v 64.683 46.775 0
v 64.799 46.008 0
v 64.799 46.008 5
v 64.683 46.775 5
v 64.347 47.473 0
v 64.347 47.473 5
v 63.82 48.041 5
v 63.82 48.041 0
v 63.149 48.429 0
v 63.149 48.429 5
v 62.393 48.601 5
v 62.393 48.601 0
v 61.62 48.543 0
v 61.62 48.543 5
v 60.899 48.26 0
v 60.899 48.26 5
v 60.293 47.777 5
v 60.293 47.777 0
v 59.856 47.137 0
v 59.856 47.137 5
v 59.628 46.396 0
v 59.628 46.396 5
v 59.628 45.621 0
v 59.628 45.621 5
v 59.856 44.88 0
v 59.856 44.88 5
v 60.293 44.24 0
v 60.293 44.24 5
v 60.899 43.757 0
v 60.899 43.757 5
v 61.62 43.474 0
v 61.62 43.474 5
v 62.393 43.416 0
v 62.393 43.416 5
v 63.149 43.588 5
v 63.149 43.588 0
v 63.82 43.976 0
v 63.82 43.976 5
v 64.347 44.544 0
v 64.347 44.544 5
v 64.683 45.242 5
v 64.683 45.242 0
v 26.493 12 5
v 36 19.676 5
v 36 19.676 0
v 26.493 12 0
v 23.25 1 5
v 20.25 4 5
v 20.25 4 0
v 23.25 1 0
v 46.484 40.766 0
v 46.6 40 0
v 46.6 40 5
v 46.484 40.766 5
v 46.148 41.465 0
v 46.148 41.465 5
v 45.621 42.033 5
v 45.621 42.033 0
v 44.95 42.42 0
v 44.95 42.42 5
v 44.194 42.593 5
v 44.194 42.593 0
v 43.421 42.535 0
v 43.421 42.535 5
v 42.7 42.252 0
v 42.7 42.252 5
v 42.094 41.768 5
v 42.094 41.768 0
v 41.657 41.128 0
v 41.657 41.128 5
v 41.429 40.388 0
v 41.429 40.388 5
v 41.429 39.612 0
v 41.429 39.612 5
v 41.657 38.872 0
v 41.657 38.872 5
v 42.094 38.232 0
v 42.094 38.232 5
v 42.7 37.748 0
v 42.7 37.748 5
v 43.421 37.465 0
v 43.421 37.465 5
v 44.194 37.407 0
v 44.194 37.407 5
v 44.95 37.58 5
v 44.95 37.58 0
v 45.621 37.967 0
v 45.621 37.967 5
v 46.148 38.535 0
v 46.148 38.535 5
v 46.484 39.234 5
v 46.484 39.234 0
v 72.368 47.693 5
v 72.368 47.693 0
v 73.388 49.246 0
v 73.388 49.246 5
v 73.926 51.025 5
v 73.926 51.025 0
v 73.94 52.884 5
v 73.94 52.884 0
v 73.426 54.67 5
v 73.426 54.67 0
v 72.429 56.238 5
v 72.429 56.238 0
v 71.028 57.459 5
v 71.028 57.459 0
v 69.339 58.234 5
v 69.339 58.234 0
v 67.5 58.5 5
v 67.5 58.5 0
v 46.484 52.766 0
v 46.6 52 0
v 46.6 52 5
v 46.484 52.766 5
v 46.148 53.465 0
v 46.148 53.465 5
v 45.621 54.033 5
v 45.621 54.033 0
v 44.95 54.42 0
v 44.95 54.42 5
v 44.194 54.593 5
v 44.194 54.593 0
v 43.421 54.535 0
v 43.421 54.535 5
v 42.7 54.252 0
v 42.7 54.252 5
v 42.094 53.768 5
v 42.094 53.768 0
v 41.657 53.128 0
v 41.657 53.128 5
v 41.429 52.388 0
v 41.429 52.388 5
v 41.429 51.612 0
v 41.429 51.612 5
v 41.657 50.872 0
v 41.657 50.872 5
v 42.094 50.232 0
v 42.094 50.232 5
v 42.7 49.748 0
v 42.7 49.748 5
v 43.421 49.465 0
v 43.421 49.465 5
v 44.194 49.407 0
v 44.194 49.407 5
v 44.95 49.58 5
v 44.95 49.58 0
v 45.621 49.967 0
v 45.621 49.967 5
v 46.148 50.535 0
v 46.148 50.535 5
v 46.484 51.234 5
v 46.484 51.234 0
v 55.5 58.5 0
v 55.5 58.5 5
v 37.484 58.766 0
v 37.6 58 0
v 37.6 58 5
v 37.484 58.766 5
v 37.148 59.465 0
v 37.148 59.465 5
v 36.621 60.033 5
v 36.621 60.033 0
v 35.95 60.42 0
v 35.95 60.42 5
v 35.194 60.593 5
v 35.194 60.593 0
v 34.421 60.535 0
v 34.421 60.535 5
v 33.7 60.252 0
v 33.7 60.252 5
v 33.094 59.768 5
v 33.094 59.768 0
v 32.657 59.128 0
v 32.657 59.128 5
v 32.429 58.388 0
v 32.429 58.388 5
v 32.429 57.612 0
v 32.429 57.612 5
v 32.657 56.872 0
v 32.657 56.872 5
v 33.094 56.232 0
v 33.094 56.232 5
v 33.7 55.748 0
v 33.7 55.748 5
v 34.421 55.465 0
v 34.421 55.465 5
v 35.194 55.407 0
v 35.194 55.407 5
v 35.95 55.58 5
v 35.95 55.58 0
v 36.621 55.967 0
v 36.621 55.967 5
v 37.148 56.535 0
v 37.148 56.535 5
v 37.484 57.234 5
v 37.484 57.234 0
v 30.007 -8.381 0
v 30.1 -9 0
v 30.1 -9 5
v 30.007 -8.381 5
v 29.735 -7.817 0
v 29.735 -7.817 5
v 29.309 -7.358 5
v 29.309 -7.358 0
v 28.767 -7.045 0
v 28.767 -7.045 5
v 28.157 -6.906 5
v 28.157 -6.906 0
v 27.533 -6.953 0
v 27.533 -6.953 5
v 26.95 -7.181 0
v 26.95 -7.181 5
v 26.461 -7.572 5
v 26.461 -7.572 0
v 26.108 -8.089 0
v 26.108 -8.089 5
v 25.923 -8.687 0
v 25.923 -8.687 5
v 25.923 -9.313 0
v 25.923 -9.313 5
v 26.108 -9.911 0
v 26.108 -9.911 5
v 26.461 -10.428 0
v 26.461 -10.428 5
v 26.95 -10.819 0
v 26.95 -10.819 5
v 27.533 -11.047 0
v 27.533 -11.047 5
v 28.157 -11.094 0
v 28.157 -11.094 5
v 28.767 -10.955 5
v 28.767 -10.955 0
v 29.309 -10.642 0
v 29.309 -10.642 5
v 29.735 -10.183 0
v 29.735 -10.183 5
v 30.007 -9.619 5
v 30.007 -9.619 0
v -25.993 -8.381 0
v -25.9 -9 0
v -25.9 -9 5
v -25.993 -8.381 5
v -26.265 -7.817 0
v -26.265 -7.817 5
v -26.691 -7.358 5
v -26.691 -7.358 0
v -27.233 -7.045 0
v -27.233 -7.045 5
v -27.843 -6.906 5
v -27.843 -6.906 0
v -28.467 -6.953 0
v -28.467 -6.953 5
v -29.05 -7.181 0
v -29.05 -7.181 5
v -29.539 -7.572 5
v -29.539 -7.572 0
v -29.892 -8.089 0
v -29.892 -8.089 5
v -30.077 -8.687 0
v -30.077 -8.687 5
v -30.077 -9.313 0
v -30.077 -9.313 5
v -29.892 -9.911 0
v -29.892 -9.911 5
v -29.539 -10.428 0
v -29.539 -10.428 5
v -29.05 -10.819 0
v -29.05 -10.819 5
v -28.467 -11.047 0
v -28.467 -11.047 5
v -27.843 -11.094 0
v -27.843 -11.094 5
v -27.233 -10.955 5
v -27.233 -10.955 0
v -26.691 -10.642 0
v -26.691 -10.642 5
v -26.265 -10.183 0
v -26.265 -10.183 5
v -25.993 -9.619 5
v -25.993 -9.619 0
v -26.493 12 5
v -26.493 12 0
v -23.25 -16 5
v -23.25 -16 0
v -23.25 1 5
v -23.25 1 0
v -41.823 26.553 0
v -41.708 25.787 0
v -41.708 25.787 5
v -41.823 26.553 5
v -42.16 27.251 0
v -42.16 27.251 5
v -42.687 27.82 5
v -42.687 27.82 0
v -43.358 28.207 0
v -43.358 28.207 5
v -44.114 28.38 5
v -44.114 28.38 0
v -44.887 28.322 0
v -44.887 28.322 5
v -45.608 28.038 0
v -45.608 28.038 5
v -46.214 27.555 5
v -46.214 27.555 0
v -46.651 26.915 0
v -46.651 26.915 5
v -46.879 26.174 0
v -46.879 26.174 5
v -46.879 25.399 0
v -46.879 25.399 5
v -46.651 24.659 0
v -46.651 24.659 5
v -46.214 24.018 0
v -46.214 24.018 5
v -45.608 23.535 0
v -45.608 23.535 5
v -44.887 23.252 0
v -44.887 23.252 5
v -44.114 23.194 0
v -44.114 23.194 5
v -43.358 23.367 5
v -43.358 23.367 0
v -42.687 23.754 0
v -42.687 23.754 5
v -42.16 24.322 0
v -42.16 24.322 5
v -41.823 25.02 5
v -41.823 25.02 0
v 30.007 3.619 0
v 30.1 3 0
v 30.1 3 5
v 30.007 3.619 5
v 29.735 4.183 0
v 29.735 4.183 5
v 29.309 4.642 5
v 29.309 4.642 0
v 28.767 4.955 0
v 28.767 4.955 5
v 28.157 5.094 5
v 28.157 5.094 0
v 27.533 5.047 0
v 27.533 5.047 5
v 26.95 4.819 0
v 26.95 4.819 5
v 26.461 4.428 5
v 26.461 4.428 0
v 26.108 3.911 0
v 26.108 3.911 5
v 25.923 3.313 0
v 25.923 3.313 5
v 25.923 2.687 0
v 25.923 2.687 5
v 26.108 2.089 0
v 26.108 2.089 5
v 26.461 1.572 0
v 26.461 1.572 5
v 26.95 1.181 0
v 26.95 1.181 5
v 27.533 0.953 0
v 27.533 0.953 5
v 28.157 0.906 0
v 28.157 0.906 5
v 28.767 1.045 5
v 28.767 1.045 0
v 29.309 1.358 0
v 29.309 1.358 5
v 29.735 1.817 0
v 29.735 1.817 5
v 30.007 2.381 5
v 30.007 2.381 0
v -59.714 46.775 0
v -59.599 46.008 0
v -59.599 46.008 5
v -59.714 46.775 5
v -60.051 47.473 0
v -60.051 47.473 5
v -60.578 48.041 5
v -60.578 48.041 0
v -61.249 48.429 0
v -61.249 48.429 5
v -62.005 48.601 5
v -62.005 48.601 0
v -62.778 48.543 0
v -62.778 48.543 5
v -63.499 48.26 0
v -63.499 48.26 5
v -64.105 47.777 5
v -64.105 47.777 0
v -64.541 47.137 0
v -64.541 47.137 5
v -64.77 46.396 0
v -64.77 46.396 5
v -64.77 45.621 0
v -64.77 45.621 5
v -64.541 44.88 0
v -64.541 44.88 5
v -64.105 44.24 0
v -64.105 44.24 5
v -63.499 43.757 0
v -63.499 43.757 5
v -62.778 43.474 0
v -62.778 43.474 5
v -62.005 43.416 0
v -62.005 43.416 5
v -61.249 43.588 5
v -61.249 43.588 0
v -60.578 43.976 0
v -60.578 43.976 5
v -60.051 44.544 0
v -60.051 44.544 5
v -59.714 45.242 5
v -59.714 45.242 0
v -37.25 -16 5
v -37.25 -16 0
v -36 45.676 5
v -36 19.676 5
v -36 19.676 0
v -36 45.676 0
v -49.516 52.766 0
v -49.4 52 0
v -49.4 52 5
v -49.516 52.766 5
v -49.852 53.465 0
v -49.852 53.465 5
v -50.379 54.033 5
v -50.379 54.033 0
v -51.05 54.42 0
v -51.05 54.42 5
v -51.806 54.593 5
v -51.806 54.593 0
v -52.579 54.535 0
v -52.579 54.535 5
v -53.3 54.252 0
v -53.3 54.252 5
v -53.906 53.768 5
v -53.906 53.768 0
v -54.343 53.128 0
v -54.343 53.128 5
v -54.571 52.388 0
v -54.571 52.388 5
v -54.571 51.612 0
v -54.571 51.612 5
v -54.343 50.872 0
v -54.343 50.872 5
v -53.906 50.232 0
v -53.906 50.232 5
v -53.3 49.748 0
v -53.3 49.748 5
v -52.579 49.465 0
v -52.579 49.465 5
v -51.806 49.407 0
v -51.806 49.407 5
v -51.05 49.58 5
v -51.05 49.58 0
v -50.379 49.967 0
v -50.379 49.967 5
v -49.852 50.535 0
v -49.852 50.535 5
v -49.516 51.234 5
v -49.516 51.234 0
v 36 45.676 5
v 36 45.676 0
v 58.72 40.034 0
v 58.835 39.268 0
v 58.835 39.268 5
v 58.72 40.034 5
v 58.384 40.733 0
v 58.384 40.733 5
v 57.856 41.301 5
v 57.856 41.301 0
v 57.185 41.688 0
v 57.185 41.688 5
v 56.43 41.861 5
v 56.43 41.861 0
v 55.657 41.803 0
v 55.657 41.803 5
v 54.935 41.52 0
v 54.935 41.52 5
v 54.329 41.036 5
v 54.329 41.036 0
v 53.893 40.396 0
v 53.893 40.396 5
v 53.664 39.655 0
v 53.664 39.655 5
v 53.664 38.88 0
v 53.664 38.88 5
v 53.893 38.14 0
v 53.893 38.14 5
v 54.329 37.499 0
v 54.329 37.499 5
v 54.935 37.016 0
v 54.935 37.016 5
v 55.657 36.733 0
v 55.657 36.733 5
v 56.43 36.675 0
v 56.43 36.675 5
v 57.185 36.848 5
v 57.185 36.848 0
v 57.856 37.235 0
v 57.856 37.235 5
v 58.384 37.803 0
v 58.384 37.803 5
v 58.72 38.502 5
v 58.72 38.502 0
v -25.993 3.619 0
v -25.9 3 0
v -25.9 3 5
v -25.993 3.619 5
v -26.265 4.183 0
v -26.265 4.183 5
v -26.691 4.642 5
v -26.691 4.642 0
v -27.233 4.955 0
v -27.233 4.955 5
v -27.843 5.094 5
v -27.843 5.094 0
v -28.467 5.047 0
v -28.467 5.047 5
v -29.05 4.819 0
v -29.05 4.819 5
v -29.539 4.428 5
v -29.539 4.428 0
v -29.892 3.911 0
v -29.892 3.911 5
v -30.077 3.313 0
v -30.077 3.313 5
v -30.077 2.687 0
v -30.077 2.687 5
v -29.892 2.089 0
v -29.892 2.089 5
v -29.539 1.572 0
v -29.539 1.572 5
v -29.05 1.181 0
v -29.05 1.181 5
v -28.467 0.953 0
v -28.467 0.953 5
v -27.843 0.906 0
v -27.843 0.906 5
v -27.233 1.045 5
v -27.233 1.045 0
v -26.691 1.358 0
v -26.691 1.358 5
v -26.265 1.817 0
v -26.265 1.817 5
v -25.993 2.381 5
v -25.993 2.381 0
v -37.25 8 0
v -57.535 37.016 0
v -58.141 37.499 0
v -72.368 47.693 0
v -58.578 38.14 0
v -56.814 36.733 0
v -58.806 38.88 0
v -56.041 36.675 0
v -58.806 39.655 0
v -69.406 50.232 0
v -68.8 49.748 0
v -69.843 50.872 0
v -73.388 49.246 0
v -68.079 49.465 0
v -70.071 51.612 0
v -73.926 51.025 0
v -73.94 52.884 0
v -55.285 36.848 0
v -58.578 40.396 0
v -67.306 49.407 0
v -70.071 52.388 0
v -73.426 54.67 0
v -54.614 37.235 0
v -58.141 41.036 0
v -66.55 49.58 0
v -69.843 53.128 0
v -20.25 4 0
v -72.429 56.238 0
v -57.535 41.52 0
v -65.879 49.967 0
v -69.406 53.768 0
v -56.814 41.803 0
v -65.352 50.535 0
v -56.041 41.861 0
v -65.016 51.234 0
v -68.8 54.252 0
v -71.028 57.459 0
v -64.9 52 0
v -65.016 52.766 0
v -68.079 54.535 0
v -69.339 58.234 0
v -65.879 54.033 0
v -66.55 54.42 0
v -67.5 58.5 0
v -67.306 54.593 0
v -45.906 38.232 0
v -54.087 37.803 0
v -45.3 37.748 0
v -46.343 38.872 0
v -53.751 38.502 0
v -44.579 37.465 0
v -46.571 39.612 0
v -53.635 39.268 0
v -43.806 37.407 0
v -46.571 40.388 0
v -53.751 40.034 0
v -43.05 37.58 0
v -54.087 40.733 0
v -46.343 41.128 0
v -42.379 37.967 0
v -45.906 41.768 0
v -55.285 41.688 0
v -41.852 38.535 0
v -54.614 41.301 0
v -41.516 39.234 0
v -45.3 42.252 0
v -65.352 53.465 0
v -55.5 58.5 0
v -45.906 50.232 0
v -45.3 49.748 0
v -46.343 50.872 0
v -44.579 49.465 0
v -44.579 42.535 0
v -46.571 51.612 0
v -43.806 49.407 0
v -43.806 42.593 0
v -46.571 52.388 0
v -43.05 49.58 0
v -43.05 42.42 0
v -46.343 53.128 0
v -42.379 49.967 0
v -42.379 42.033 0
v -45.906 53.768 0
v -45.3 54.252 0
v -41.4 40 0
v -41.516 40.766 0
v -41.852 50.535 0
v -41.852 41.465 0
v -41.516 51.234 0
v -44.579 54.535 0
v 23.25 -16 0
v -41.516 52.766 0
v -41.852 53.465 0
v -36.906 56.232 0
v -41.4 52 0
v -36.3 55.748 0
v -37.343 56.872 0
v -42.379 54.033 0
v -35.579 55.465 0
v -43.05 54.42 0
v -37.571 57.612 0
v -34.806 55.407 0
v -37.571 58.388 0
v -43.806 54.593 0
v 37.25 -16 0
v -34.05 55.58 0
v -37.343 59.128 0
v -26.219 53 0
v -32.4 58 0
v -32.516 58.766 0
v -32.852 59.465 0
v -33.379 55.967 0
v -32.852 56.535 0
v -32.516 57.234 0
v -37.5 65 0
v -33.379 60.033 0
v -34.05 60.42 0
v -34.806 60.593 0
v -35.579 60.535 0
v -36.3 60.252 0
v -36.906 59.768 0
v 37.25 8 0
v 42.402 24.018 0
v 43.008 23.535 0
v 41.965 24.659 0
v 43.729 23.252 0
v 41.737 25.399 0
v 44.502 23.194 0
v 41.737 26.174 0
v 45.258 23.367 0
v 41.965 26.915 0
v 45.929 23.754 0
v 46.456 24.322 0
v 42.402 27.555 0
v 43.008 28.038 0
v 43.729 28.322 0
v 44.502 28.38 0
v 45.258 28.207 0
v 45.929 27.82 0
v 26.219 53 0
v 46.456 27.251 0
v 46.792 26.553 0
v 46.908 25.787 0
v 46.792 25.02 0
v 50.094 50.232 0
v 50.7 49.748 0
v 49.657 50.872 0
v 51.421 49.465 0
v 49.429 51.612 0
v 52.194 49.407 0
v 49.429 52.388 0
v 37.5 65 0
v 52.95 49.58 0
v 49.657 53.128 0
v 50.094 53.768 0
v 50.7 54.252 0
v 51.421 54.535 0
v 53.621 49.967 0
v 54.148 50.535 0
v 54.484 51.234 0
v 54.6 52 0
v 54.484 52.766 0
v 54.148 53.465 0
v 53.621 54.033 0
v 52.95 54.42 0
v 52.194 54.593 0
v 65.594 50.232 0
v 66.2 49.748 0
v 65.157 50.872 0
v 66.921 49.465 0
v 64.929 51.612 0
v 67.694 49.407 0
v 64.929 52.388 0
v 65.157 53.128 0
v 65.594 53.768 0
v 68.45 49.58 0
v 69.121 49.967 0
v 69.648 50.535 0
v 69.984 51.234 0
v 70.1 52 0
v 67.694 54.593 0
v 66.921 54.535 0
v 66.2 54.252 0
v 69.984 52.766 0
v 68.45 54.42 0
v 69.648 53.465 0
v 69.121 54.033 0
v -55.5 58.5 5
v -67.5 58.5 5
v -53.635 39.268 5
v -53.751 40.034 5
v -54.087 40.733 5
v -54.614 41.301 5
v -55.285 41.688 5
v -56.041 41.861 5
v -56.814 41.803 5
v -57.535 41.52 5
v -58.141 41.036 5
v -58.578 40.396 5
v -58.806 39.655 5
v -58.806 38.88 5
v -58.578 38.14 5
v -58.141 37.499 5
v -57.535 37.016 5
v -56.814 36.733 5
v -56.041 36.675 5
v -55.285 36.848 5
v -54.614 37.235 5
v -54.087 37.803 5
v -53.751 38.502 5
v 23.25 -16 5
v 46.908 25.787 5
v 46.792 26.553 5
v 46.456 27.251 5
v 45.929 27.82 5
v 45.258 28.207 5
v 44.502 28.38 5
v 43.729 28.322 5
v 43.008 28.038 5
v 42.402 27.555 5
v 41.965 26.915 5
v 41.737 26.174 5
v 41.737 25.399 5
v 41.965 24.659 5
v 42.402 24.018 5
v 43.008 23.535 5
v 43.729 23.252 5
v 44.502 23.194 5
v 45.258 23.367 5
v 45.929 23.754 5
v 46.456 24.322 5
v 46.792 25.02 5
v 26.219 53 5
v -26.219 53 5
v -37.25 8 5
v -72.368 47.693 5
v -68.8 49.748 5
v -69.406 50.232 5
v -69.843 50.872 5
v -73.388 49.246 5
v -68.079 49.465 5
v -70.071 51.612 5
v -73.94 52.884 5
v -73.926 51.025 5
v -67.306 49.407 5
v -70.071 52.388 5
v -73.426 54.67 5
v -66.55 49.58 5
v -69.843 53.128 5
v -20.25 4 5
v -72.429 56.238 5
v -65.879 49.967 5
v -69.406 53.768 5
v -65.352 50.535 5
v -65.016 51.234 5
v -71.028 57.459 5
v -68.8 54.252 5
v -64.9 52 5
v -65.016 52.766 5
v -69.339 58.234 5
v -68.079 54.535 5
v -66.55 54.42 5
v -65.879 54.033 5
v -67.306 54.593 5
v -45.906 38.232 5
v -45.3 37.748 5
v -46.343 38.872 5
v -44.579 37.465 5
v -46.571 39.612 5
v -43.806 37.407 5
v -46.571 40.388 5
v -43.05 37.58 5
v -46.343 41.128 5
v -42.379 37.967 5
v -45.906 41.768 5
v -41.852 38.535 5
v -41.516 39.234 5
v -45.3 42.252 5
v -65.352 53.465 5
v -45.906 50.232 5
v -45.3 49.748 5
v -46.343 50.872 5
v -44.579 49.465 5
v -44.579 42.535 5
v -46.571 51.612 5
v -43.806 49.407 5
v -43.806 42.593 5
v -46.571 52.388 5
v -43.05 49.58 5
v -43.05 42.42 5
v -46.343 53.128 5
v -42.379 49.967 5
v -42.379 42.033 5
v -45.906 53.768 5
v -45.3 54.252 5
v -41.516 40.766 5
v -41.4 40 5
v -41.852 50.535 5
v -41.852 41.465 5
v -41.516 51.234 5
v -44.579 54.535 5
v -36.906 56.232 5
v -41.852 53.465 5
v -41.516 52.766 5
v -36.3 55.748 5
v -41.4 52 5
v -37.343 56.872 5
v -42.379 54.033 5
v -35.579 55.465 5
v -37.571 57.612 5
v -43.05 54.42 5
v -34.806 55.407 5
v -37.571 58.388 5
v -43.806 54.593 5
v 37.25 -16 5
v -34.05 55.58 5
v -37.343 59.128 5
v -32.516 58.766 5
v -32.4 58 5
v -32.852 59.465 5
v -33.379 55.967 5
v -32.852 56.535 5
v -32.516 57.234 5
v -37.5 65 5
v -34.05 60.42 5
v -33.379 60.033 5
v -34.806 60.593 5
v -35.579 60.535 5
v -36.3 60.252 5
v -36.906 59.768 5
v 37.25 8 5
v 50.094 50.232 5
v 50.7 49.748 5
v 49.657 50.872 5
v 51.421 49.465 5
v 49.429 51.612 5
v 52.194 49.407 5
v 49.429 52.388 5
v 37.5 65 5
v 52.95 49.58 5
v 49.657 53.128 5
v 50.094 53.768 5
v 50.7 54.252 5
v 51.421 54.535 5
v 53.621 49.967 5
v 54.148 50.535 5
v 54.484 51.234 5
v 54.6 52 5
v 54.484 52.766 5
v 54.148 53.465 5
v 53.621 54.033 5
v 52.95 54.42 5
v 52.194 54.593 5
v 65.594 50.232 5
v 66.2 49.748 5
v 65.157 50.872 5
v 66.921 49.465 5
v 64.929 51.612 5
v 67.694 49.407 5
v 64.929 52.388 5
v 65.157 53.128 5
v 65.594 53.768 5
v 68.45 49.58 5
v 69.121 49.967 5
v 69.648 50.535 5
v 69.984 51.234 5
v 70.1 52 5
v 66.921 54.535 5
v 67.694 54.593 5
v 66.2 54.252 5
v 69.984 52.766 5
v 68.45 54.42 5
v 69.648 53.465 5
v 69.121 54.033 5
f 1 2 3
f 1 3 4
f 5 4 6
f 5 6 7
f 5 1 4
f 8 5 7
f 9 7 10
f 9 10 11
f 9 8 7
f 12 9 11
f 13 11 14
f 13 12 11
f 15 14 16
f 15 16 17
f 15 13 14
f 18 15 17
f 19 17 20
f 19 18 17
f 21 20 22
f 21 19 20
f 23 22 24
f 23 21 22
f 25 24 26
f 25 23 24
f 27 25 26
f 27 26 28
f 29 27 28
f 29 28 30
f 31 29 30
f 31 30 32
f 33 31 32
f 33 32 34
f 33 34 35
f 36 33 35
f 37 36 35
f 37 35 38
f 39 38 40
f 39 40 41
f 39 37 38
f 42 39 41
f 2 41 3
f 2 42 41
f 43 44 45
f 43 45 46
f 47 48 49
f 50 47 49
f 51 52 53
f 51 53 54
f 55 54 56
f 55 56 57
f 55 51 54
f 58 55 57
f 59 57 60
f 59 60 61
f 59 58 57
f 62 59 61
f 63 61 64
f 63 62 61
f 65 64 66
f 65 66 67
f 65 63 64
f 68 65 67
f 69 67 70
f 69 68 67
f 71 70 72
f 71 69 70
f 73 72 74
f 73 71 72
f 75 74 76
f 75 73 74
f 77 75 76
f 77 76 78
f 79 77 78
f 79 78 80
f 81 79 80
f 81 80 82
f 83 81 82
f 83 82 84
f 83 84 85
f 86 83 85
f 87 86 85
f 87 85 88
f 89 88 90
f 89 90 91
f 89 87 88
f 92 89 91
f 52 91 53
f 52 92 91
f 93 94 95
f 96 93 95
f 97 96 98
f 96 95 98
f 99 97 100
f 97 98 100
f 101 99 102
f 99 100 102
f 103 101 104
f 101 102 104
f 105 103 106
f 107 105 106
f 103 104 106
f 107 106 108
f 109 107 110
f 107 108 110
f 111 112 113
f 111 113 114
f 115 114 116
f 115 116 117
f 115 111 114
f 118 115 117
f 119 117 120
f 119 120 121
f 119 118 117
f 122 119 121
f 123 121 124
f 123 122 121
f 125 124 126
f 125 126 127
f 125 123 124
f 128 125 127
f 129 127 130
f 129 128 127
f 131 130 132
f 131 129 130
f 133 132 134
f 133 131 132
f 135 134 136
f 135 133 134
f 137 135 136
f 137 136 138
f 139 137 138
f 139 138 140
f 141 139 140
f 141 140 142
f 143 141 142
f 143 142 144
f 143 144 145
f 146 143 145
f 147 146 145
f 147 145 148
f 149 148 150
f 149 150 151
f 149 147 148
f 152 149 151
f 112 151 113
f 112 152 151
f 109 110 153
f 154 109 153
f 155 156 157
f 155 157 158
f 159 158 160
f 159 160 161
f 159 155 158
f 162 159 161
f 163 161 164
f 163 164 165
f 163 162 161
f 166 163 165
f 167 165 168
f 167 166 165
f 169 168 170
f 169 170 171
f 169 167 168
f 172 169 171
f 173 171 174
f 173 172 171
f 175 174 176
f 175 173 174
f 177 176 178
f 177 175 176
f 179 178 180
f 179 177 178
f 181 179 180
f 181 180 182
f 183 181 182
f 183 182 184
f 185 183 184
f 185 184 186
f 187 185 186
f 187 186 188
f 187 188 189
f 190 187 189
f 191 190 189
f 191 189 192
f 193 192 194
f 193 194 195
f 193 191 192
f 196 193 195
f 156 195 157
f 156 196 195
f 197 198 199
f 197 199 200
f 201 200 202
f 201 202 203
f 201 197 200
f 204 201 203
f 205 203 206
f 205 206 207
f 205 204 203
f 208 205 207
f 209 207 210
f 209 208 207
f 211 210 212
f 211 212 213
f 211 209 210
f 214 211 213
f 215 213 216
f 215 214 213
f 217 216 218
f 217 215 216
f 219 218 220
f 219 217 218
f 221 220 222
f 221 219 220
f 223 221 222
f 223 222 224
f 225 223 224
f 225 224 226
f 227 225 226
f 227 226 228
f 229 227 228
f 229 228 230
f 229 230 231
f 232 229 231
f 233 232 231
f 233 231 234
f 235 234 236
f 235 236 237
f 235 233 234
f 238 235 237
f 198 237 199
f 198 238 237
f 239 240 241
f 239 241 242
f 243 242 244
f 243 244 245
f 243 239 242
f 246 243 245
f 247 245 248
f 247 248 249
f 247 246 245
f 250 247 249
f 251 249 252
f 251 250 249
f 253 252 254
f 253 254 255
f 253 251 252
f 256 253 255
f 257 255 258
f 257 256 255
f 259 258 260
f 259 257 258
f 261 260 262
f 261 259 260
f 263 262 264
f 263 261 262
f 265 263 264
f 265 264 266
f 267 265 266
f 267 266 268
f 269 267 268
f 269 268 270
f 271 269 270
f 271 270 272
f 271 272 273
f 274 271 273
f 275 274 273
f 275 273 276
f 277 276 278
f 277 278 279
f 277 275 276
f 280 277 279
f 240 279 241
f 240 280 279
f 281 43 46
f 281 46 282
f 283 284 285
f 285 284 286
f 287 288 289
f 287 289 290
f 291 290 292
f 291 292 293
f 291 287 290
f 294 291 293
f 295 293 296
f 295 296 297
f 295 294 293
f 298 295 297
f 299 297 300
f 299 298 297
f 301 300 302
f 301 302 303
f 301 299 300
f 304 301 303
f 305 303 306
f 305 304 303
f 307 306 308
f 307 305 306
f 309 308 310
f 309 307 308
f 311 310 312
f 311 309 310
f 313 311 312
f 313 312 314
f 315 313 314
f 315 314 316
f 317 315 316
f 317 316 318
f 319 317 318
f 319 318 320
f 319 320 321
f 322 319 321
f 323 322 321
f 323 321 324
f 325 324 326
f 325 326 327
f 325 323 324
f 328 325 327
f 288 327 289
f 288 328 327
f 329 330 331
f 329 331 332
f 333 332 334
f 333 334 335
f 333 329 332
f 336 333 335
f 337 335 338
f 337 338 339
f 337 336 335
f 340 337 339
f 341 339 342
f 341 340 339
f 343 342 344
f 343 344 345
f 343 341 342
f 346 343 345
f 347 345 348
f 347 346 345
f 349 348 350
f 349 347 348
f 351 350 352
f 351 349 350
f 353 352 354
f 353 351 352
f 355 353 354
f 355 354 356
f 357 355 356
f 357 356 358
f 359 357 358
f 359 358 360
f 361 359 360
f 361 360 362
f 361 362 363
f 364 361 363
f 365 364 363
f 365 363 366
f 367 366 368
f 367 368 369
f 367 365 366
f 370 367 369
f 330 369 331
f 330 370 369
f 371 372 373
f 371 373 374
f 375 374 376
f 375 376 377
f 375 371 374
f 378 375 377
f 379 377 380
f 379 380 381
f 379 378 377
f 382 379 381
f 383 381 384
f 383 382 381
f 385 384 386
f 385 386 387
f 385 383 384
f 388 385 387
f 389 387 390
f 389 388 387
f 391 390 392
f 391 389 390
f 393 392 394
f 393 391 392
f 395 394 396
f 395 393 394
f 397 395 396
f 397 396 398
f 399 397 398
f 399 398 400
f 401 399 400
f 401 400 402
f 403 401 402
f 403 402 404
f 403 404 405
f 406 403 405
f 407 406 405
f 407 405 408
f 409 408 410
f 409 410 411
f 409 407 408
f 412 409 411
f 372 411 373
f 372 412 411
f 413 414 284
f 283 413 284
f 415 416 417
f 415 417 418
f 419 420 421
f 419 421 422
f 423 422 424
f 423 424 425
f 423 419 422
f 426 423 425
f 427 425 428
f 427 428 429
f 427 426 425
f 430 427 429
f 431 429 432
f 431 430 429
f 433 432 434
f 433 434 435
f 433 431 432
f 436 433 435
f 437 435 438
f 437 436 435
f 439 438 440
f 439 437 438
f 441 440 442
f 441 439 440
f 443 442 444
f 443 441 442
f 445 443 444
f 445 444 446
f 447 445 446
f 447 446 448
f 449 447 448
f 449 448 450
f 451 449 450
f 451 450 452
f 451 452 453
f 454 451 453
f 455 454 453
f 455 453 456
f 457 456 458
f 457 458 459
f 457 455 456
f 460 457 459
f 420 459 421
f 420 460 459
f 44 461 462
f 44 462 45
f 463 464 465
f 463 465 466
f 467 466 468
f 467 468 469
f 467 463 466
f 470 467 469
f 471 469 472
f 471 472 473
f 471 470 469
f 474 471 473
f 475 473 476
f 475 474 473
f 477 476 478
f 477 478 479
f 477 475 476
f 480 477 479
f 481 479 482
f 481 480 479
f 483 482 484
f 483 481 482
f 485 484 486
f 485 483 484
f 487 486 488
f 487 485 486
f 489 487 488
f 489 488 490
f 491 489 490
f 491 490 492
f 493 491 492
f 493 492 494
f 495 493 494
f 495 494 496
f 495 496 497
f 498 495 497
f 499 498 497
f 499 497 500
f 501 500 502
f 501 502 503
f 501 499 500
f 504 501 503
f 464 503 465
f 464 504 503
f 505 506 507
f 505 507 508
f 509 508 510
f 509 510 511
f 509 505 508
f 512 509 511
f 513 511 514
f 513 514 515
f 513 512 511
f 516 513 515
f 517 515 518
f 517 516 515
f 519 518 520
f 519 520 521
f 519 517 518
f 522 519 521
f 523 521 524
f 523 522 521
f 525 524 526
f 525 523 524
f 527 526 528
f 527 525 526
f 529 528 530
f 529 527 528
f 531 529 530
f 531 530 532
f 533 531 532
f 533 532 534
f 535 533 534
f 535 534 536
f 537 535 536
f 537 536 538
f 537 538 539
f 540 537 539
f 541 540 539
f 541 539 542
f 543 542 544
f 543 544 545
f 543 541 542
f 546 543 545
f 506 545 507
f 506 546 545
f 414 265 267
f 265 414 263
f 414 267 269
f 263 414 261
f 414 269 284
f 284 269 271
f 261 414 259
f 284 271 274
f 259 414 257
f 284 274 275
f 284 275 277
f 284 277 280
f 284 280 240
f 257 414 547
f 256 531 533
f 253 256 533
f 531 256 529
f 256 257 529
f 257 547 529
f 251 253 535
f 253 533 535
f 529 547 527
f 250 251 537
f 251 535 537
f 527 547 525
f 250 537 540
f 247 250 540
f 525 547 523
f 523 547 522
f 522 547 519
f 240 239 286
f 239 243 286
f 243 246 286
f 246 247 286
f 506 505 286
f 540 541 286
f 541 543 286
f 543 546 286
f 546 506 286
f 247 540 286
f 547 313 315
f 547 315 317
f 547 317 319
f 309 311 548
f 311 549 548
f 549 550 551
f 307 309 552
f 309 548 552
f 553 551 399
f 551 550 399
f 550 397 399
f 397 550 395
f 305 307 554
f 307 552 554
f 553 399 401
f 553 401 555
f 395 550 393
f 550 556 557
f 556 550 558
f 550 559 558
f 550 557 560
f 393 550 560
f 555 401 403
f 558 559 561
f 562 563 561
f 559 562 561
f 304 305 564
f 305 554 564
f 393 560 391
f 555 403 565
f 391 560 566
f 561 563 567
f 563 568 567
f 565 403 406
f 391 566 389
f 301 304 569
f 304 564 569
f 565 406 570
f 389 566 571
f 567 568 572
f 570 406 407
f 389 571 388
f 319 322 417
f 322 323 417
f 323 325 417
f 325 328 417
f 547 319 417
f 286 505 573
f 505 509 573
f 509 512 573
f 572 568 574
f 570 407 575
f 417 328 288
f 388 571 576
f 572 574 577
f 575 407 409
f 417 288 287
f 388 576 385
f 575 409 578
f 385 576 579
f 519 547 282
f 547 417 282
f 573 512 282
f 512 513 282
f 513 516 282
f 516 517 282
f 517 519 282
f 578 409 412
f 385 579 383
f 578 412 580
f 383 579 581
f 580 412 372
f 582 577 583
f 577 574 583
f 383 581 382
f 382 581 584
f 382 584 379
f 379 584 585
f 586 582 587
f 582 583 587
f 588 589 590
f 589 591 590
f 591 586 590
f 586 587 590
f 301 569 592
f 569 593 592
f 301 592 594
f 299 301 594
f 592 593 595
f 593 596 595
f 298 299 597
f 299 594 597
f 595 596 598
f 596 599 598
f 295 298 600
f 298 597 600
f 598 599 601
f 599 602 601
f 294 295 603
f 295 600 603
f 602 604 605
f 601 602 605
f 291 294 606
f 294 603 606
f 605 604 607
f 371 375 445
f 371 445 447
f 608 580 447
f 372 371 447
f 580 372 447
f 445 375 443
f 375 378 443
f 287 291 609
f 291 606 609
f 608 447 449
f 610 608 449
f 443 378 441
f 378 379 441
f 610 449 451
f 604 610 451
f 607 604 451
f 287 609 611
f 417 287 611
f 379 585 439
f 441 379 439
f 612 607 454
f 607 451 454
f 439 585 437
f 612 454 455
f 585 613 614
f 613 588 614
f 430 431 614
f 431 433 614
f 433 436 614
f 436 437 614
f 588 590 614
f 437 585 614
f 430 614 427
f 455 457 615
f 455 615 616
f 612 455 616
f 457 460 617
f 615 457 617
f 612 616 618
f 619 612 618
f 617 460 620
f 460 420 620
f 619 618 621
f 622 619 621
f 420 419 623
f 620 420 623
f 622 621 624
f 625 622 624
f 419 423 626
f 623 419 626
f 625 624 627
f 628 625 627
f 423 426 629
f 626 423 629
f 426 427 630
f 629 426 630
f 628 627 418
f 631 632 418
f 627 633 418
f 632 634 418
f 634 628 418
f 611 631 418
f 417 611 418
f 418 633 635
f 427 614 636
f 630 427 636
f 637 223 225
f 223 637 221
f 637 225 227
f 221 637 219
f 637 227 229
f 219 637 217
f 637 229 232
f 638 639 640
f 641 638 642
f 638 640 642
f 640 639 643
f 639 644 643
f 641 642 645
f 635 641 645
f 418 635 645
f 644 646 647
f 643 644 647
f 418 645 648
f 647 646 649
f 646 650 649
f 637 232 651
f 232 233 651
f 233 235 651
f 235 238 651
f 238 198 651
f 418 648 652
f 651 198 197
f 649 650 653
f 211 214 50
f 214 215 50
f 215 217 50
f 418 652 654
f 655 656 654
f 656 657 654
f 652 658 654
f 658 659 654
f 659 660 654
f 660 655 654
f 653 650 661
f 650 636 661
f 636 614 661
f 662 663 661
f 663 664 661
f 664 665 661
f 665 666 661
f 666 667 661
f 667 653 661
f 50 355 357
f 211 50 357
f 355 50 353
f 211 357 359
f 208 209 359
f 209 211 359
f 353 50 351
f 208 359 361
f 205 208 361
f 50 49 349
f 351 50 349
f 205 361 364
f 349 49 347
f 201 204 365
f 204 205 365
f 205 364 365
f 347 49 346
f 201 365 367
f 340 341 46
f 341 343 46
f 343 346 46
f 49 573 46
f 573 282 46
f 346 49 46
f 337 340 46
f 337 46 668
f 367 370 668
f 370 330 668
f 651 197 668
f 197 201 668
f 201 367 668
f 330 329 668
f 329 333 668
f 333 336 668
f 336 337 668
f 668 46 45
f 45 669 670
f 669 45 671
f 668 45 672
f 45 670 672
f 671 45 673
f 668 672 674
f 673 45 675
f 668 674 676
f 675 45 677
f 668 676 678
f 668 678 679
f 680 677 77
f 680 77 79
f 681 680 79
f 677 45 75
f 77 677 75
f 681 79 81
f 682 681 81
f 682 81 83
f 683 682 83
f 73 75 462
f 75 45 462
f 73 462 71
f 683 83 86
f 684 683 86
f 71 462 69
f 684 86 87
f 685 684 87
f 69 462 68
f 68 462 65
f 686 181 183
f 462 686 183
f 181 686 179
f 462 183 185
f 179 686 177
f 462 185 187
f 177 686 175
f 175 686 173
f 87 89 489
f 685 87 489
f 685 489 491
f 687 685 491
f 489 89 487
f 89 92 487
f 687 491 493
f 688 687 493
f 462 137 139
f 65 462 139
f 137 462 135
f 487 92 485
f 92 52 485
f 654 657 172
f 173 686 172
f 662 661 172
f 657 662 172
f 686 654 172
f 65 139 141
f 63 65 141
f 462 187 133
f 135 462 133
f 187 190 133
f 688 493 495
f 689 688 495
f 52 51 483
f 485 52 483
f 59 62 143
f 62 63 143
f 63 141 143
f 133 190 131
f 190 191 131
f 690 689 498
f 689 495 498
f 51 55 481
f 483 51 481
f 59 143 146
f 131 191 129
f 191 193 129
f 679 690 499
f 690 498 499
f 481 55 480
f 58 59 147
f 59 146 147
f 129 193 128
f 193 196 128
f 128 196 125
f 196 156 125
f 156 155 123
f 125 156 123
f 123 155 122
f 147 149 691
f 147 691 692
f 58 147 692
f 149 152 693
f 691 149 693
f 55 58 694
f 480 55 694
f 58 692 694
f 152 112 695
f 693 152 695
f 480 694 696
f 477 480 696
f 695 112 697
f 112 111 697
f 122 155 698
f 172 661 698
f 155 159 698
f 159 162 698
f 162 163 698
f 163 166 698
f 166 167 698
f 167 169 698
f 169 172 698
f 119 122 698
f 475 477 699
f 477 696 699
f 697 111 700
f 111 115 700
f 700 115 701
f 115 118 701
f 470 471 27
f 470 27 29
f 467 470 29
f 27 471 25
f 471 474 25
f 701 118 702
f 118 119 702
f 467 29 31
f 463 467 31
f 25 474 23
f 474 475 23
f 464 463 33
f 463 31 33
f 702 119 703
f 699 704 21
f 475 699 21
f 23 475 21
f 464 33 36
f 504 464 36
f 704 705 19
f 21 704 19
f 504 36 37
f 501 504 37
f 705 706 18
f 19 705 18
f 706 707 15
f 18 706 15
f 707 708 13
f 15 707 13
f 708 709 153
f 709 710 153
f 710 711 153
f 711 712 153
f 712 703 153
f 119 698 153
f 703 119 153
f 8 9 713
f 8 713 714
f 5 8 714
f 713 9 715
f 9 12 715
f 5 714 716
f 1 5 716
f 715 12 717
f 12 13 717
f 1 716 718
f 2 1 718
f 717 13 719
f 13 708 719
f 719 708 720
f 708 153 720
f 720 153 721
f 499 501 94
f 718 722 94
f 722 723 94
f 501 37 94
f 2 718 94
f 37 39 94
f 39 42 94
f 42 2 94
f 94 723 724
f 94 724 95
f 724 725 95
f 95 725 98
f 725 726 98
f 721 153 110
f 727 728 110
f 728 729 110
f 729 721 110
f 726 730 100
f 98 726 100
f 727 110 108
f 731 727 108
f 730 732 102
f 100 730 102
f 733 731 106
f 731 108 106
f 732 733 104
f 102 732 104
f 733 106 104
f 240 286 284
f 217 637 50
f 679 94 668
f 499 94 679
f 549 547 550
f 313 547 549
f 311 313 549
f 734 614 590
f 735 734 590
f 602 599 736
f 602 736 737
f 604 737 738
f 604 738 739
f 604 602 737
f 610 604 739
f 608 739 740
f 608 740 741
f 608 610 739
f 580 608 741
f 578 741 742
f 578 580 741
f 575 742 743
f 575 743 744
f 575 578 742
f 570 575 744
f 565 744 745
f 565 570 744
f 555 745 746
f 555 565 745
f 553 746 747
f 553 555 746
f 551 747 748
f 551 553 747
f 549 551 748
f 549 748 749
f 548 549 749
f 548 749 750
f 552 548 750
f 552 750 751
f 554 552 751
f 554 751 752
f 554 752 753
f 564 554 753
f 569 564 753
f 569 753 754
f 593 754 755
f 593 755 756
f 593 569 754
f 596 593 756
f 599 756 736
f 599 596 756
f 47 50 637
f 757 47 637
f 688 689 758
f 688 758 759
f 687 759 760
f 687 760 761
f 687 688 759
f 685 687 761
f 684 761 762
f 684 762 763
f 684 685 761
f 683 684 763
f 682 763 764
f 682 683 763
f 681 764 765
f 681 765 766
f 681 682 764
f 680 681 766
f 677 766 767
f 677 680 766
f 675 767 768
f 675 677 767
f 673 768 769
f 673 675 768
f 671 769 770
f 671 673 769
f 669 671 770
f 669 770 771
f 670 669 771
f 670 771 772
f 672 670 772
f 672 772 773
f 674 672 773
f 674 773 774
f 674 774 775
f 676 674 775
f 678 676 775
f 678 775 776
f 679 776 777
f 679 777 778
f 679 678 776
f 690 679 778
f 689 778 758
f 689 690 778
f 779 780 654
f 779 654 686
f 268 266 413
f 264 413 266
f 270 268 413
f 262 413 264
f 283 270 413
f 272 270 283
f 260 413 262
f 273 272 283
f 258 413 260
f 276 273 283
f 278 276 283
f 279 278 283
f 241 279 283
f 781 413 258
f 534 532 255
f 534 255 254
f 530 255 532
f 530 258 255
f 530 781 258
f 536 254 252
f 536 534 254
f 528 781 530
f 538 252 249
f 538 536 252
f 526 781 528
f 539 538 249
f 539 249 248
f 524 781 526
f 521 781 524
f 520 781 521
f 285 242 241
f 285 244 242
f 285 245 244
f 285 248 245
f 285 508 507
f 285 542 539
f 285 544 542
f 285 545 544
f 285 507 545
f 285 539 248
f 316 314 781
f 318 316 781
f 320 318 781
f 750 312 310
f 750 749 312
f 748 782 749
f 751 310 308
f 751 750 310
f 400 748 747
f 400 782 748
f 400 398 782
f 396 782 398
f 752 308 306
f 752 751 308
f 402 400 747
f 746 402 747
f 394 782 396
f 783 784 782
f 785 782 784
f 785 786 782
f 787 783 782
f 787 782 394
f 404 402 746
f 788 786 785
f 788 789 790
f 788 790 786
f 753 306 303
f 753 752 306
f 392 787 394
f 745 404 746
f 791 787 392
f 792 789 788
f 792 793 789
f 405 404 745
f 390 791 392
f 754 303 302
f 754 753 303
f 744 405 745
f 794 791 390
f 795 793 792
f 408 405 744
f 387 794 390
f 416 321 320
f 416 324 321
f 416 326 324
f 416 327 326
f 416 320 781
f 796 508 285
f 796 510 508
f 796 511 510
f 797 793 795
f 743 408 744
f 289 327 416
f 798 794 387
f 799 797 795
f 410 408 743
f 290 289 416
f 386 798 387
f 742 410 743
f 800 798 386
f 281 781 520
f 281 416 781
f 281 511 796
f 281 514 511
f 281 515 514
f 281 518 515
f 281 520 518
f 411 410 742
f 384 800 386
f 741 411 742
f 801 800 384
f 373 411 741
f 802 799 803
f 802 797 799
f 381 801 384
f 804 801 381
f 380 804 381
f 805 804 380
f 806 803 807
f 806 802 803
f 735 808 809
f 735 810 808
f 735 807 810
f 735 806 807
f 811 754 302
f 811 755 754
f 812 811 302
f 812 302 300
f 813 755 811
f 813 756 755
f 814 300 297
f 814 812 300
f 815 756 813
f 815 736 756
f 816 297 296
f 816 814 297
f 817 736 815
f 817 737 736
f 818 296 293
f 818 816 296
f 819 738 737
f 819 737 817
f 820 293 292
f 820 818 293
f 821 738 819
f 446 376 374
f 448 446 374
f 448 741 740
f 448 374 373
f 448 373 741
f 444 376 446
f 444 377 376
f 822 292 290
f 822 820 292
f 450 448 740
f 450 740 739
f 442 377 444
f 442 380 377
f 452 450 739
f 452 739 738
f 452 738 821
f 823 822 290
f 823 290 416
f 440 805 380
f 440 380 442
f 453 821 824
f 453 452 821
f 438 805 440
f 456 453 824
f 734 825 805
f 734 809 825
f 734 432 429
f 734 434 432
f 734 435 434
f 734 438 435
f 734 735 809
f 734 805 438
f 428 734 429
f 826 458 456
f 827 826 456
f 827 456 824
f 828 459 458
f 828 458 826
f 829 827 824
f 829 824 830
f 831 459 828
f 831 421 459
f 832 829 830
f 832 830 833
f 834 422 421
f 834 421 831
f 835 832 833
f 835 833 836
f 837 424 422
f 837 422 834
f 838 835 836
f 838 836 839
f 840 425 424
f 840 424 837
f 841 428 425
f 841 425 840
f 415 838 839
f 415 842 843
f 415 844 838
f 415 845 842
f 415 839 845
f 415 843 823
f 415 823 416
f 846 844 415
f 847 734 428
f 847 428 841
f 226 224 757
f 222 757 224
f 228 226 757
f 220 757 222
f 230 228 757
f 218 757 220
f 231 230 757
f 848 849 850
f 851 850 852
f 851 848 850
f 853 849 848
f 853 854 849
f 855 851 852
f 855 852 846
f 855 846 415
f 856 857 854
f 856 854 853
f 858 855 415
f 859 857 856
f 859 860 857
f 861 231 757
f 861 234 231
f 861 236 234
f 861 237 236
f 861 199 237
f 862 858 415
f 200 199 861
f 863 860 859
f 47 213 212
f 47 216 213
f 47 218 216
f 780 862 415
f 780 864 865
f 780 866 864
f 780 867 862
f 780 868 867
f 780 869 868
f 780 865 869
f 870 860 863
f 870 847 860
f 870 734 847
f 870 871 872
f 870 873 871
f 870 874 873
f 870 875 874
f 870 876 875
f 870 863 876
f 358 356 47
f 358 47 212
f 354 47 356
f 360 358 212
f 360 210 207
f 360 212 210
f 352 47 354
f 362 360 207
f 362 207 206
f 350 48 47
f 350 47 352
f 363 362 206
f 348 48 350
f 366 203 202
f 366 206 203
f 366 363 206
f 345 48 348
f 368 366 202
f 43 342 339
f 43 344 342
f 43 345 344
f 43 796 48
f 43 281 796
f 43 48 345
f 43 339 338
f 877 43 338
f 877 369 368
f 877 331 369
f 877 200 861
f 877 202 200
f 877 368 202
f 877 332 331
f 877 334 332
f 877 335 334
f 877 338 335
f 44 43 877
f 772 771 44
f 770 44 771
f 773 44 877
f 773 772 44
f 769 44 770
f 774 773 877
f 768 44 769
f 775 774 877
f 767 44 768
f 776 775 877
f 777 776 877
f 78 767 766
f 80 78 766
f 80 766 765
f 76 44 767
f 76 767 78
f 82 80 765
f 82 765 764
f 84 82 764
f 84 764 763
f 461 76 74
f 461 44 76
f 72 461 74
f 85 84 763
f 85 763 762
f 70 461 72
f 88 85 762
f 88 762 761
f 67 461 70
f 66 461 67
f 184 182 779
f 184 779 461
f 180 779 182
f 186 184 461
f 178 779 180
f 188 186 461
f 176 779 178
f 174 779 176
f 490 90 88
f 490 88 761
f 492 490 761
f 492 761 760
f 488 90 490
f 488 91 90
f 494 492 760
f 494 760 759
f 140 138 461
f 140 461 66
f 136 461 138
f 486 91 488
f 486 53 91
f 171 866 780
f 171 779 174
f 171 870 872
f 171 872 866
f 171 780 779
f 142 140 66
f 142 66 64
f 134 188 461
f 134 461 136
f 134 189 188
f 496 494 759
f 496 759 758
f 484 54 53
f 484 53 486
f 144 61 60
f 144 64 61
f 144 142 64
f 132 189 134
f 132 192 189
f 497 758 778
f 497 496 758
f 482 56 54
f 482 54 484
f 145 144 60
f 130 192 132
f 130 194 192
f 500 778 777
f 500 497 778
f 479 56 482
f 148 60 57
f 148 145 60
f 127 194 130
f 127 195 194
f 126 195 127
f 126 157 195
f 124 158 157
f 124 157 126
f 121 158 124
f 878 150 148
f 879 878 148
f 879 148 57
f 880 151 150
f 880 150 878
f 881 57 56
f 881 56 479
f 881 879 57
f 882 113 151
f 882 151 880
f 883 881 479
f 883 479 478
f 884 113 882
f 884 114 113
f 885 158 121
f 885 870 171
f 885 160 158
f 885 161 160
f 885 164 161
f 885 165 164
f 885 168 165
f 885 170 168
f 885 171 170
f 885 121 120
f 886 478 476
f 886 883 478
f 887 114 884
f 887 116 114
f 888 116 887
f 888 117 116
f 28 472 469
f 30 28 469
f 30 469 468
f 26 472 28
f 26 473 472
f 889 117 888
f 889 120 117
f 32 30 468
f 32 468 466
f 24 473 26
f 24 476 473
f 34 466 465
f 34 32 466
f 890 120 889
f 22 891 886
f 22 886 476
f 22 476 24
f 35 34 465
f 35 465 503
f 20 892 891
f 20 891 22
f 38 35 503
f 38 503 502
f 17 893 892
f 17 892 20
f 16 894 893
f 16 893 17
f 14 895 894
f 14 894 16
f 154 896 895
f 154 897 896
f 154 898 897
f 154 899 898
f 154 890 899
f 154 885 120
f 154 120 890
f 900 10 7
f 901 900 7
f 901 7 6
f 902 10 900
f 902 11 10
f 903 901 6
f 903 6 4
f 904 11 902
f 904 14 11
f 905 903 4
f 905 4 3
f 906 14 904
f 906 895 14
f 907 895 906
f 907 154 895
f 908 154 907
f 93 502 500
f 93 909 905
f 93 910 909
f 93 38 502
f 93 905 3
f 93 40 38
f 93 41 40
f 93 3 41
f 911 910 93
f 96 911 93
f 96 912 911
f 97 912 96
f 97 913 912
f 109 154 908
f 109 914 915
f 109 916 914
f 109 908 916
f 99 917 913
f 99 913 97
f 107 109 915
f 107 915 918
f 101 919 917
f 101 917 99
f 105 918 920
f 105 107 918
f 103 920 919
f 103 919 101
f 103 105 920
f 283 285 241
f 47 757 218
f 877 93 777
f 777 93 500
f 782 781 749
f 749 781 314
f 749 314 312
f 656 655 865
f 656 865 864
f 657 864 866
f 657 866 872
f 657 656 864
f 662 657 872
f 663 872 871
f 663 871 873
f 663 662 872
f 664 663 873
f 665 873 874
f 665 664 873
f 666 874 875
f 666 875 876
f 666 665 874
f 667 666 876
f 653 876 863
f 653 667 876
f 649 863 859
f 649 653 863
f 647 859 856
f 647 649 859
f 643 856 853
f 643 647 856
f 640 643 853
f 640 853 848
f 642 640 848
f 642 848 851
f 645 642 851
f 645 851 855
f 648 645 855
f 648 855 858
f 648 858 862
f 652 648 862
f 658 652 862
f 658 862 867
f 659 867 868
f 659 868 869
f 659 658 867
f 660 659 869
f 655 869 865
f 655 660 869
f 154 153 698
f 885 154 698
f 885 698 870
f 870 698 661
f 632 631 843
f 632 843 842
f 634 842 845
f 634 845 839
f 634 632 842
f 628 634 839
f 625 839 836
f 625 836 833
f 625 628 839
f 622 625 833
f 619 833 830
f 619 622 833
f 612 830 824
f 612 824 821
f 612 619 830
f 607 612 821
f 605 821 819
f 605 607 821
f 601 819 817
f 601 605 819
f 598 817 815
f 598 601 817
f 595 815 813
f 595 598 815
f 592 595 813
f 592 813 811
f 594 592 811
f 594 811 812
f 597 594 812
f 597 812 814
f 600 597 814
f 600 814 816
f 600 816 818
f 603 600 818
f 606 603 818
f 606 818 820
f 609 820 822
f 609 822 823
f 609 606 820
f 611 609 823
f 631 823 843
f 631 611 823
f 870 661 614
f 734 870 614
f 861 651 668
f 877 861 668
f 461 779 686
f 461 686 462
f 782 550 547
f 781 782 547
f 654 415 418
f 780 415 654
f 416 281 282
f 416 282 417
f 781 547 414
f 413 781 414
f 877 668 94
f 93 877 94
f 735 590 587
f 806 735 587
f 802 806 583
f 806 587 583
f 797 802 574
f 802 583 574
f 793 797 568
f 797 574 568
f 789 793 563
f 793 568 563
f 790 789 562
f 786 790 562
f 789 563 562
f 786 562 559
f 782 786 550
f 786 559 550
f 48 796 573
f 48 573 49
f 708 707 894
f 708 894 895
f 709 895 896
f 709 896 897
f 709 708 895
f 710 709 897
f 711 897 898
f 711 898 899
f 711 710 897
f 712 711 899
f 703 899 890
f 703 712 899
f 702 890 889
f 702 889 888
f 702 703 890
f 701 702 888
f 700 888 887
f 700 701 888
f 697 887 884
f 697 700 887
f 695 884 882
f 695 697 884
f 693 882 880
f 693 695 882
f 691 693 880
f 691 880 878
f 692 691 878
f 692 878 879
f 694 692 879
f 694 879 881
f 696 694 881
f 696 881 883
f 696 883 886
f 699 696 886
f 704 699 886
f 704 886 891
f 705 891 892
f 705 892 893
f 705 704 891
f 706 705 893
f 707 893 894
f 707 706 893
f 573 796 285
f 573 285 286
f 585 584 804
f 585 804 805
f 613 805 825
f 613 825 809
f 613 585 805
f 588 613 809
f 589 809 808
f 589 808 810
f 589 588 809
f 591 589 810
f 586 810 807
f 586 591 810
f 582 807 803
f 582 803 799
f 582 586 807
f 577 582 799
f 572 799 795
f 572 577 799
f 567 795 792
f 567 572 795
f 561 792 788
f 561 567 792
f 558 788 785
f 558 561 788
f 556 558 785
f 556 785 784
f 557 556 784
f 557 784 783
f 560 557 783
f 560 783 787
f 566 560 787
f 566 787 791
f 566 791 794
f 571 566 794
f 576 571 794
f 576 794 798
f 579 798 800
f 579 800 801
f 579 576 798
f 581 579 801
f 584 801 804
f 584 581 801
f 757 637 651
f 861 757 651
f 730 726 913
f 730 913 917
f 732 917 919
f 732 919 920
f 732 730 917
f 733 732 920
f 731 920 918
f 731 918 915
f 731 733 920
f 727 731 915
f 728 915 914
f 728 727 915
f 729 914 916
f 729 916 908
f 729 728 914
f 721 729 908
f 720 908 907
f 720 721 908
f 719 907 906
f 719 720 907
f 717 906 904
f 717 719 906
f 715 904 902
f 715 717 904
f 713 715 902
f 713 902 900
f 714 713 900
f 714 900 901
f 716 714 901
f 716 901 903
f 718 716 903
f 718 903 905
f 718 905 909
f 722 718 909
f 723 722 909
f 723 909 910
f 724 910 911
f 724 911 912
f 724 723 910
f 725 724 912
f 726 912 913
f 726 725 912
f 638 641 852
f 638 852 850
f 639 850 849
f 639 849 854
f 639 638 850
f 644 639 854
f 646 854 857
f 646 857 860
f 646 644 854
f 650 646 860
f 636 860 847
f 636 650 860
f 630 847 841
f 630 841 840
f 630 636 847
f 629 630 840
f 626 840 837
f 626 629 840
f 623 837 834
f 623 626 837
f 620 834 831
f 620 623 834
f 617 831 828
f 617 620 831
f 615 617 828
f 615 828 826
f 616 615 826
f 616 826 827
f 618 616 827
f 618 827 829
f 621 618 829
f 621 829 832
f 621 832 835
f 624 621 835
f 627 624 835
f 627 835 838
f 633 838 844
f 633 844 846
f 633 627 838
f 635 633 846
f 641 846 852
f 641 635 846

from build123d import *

# Parameters (mm, degrees)
SKETCH_2_R          = 2.1
SKETCH_2_R_2        = 2.6
EXTRUDE_1_DEPTH     = 5
CUT_EXTRUDE_1_DEPTH = 5
SKETCH_5_W          = 46.5
SKETCH_5_H          = 4
CUT_EXTRUDE_2_DEPTH = 5
CHAMFER_2_SIZE      = 3


with BuildPart() as part:
    # 草图2 → 凸台-拉伸1 (new body)
    with BuildSketch(Plane.XY):
        with BuildLine():
            Line((-23.25, 0), (23.25, 0))
            Line((23.25, 0), (23.25, -16))
            Line((23.25, -16), (37.25, -16))
            Line((37.25, -16), (37.25, 8))
            Line((37.25, 8), (72.368161114, 47.692911962))
            ThreePointArc((72.368161114, 47.692911962), (73.426469111, 54.669637405), (67.5, 58.5))
            Line((67.5, 58.5), (55.5, 58.5))
            Line((55.5, 58.5), (37.5, 65))
            Line((37.5, 65), (-37.5, 65))
            Line((-37.5, 65), (-55.5, 58.5))
            Line((-55.5, 58.5), (-67.5, 58.5))
            ThreePointArc((-67.5, 58.5), (-73.426469111, 54.669637405), (-72.368161114, 47.692911962))
            Line((-72.368161114, 47.692911962), (-37.25, 8))
            Line((-37.25, 8), (-37.25, -16))
            Line((-37.25, -16), (-23.25, -16))
            Line((-23.25, -16), (-23.25, 0))
        make_face()
        with Locations((28, -9)):
            Circle(SKETCH_2_R, mode=Mode.SUBTRACT)
        with Locations((28, 3)):
            Circle(SKETCH_2_R, mode=Mode.SUBTRACT)
        with Locations((44.307987485, 25.786824772)):
            Circle(SKETCH_2_R_2, mode=Mode.SUBTRACT)
        with Locations((56.235308207, 39.267886318)):
            Circle(SKETCH_2_R_2, mode=Mode.SUBTRACT)
        with Locations((62.198968568, 46.008417091)):
            Circle(SKETCH_2_R_2, mode=Mode.SUBTRACT)
        with Locations((67.5, 52)):
            Circle(SKETCH_2_R_2, mode=Mode.SUBTRACT)
        with Locations((44, 40)):
            Circle(SKETCH_2_R_2, mode=Mode.SUBTRACT)
        with Locations((44, 52)):
            Circle(SKETCH_2_R_2, mode=Mode.SUBTRACT)
        with Locations((52, 52)):
            Circle(SKETCH_2_R_2, mode=Mode.SUBTRACT)
        with Locations((35, 58)):
            Circle(SKETCH_2_R_2, mode=Mode.SUBTRACT)
        with Locations((-67.5, 52)):
            Circle(SKETCH_2_R_2, mode=Mode.SUBTRACT)
        with Locations((-62.198968568, 46.008417091)):
            Circle(SKETCH_2_R_2, mode=Mode.SUBTRACT)
        with Locations((-56.235308207, 39.267886318)):
            Circle(SKETCH_2_R_2, mode=Mode.SUBTRACT)
        with Locations((-44.307987485, 25.786824772)):
            Circle(SKETCH_2_R_2, mode=Mode.SUBTRACT)
        with Locations((-44, 40)):
            Circle(SKETCH_2_R_2, mode=Mode.SUBTRACT)
        with Locations((-52, 52)):
            Circle(SKETCH_2_R_2, mode=Mode.SUBTRACT)
        with Locations((-44, 52)):
            Circle(SKETCH_2_R_2, mode=Mode.SUBTRACT)
        with Locations((-35, 58)):
            Circle(SKETCH_2_R_2, mode=Mode.SUBTRACT)
        with Locations((-28, -9)):
            Circle(SKETCH_2_R, mode=Mode.SUBTRACT)
        with Locations((-28, 3)):
            Circle(SKETCH_2_R, mode=Mode.SUBTRACT)
    extrude(amount=EXTRUDE_1_DEPTH)

    # 草图3 → 切除-拉伸1 (cut)
    with BuildSketch(Plane.XY.offset(5)):
        Polygon((-26.219338455, 53), (26.219338455, 53), (36, 45.675774443), (36, 19.675774443), (26.492733991, 12), (-26.492733991, 12), (-36, 19.675774443), (-36, 45.675774443), align=None)
    extrude(amount=-CUT_EXTRUDE_1_DEPTH, mode=Mode.SUBTRACT)

    # 草图5 → 切除-拉伸2 (cut)
    with BuildSketch(Plane.XY.offset(5)):
        with Locations((0, 2)):
            Rectangle(SKETCH_5_W, SKETCH_5_H)
    extrude(amount=-CUT_EXTRUDE_2_DEPTH, mode=Mode.SUBTRACT)

    # 倒角2
    chamfer_2_edges = [part.edges().sort_by_distance(p)[0] for p in [
        (-23.25, 4, 2.5),
        (23.25, 4, 2.5),
    ]]
    chamfer(chamfer_2_edges, length=CHAMFER_2_SIZE)


solid = part.part
